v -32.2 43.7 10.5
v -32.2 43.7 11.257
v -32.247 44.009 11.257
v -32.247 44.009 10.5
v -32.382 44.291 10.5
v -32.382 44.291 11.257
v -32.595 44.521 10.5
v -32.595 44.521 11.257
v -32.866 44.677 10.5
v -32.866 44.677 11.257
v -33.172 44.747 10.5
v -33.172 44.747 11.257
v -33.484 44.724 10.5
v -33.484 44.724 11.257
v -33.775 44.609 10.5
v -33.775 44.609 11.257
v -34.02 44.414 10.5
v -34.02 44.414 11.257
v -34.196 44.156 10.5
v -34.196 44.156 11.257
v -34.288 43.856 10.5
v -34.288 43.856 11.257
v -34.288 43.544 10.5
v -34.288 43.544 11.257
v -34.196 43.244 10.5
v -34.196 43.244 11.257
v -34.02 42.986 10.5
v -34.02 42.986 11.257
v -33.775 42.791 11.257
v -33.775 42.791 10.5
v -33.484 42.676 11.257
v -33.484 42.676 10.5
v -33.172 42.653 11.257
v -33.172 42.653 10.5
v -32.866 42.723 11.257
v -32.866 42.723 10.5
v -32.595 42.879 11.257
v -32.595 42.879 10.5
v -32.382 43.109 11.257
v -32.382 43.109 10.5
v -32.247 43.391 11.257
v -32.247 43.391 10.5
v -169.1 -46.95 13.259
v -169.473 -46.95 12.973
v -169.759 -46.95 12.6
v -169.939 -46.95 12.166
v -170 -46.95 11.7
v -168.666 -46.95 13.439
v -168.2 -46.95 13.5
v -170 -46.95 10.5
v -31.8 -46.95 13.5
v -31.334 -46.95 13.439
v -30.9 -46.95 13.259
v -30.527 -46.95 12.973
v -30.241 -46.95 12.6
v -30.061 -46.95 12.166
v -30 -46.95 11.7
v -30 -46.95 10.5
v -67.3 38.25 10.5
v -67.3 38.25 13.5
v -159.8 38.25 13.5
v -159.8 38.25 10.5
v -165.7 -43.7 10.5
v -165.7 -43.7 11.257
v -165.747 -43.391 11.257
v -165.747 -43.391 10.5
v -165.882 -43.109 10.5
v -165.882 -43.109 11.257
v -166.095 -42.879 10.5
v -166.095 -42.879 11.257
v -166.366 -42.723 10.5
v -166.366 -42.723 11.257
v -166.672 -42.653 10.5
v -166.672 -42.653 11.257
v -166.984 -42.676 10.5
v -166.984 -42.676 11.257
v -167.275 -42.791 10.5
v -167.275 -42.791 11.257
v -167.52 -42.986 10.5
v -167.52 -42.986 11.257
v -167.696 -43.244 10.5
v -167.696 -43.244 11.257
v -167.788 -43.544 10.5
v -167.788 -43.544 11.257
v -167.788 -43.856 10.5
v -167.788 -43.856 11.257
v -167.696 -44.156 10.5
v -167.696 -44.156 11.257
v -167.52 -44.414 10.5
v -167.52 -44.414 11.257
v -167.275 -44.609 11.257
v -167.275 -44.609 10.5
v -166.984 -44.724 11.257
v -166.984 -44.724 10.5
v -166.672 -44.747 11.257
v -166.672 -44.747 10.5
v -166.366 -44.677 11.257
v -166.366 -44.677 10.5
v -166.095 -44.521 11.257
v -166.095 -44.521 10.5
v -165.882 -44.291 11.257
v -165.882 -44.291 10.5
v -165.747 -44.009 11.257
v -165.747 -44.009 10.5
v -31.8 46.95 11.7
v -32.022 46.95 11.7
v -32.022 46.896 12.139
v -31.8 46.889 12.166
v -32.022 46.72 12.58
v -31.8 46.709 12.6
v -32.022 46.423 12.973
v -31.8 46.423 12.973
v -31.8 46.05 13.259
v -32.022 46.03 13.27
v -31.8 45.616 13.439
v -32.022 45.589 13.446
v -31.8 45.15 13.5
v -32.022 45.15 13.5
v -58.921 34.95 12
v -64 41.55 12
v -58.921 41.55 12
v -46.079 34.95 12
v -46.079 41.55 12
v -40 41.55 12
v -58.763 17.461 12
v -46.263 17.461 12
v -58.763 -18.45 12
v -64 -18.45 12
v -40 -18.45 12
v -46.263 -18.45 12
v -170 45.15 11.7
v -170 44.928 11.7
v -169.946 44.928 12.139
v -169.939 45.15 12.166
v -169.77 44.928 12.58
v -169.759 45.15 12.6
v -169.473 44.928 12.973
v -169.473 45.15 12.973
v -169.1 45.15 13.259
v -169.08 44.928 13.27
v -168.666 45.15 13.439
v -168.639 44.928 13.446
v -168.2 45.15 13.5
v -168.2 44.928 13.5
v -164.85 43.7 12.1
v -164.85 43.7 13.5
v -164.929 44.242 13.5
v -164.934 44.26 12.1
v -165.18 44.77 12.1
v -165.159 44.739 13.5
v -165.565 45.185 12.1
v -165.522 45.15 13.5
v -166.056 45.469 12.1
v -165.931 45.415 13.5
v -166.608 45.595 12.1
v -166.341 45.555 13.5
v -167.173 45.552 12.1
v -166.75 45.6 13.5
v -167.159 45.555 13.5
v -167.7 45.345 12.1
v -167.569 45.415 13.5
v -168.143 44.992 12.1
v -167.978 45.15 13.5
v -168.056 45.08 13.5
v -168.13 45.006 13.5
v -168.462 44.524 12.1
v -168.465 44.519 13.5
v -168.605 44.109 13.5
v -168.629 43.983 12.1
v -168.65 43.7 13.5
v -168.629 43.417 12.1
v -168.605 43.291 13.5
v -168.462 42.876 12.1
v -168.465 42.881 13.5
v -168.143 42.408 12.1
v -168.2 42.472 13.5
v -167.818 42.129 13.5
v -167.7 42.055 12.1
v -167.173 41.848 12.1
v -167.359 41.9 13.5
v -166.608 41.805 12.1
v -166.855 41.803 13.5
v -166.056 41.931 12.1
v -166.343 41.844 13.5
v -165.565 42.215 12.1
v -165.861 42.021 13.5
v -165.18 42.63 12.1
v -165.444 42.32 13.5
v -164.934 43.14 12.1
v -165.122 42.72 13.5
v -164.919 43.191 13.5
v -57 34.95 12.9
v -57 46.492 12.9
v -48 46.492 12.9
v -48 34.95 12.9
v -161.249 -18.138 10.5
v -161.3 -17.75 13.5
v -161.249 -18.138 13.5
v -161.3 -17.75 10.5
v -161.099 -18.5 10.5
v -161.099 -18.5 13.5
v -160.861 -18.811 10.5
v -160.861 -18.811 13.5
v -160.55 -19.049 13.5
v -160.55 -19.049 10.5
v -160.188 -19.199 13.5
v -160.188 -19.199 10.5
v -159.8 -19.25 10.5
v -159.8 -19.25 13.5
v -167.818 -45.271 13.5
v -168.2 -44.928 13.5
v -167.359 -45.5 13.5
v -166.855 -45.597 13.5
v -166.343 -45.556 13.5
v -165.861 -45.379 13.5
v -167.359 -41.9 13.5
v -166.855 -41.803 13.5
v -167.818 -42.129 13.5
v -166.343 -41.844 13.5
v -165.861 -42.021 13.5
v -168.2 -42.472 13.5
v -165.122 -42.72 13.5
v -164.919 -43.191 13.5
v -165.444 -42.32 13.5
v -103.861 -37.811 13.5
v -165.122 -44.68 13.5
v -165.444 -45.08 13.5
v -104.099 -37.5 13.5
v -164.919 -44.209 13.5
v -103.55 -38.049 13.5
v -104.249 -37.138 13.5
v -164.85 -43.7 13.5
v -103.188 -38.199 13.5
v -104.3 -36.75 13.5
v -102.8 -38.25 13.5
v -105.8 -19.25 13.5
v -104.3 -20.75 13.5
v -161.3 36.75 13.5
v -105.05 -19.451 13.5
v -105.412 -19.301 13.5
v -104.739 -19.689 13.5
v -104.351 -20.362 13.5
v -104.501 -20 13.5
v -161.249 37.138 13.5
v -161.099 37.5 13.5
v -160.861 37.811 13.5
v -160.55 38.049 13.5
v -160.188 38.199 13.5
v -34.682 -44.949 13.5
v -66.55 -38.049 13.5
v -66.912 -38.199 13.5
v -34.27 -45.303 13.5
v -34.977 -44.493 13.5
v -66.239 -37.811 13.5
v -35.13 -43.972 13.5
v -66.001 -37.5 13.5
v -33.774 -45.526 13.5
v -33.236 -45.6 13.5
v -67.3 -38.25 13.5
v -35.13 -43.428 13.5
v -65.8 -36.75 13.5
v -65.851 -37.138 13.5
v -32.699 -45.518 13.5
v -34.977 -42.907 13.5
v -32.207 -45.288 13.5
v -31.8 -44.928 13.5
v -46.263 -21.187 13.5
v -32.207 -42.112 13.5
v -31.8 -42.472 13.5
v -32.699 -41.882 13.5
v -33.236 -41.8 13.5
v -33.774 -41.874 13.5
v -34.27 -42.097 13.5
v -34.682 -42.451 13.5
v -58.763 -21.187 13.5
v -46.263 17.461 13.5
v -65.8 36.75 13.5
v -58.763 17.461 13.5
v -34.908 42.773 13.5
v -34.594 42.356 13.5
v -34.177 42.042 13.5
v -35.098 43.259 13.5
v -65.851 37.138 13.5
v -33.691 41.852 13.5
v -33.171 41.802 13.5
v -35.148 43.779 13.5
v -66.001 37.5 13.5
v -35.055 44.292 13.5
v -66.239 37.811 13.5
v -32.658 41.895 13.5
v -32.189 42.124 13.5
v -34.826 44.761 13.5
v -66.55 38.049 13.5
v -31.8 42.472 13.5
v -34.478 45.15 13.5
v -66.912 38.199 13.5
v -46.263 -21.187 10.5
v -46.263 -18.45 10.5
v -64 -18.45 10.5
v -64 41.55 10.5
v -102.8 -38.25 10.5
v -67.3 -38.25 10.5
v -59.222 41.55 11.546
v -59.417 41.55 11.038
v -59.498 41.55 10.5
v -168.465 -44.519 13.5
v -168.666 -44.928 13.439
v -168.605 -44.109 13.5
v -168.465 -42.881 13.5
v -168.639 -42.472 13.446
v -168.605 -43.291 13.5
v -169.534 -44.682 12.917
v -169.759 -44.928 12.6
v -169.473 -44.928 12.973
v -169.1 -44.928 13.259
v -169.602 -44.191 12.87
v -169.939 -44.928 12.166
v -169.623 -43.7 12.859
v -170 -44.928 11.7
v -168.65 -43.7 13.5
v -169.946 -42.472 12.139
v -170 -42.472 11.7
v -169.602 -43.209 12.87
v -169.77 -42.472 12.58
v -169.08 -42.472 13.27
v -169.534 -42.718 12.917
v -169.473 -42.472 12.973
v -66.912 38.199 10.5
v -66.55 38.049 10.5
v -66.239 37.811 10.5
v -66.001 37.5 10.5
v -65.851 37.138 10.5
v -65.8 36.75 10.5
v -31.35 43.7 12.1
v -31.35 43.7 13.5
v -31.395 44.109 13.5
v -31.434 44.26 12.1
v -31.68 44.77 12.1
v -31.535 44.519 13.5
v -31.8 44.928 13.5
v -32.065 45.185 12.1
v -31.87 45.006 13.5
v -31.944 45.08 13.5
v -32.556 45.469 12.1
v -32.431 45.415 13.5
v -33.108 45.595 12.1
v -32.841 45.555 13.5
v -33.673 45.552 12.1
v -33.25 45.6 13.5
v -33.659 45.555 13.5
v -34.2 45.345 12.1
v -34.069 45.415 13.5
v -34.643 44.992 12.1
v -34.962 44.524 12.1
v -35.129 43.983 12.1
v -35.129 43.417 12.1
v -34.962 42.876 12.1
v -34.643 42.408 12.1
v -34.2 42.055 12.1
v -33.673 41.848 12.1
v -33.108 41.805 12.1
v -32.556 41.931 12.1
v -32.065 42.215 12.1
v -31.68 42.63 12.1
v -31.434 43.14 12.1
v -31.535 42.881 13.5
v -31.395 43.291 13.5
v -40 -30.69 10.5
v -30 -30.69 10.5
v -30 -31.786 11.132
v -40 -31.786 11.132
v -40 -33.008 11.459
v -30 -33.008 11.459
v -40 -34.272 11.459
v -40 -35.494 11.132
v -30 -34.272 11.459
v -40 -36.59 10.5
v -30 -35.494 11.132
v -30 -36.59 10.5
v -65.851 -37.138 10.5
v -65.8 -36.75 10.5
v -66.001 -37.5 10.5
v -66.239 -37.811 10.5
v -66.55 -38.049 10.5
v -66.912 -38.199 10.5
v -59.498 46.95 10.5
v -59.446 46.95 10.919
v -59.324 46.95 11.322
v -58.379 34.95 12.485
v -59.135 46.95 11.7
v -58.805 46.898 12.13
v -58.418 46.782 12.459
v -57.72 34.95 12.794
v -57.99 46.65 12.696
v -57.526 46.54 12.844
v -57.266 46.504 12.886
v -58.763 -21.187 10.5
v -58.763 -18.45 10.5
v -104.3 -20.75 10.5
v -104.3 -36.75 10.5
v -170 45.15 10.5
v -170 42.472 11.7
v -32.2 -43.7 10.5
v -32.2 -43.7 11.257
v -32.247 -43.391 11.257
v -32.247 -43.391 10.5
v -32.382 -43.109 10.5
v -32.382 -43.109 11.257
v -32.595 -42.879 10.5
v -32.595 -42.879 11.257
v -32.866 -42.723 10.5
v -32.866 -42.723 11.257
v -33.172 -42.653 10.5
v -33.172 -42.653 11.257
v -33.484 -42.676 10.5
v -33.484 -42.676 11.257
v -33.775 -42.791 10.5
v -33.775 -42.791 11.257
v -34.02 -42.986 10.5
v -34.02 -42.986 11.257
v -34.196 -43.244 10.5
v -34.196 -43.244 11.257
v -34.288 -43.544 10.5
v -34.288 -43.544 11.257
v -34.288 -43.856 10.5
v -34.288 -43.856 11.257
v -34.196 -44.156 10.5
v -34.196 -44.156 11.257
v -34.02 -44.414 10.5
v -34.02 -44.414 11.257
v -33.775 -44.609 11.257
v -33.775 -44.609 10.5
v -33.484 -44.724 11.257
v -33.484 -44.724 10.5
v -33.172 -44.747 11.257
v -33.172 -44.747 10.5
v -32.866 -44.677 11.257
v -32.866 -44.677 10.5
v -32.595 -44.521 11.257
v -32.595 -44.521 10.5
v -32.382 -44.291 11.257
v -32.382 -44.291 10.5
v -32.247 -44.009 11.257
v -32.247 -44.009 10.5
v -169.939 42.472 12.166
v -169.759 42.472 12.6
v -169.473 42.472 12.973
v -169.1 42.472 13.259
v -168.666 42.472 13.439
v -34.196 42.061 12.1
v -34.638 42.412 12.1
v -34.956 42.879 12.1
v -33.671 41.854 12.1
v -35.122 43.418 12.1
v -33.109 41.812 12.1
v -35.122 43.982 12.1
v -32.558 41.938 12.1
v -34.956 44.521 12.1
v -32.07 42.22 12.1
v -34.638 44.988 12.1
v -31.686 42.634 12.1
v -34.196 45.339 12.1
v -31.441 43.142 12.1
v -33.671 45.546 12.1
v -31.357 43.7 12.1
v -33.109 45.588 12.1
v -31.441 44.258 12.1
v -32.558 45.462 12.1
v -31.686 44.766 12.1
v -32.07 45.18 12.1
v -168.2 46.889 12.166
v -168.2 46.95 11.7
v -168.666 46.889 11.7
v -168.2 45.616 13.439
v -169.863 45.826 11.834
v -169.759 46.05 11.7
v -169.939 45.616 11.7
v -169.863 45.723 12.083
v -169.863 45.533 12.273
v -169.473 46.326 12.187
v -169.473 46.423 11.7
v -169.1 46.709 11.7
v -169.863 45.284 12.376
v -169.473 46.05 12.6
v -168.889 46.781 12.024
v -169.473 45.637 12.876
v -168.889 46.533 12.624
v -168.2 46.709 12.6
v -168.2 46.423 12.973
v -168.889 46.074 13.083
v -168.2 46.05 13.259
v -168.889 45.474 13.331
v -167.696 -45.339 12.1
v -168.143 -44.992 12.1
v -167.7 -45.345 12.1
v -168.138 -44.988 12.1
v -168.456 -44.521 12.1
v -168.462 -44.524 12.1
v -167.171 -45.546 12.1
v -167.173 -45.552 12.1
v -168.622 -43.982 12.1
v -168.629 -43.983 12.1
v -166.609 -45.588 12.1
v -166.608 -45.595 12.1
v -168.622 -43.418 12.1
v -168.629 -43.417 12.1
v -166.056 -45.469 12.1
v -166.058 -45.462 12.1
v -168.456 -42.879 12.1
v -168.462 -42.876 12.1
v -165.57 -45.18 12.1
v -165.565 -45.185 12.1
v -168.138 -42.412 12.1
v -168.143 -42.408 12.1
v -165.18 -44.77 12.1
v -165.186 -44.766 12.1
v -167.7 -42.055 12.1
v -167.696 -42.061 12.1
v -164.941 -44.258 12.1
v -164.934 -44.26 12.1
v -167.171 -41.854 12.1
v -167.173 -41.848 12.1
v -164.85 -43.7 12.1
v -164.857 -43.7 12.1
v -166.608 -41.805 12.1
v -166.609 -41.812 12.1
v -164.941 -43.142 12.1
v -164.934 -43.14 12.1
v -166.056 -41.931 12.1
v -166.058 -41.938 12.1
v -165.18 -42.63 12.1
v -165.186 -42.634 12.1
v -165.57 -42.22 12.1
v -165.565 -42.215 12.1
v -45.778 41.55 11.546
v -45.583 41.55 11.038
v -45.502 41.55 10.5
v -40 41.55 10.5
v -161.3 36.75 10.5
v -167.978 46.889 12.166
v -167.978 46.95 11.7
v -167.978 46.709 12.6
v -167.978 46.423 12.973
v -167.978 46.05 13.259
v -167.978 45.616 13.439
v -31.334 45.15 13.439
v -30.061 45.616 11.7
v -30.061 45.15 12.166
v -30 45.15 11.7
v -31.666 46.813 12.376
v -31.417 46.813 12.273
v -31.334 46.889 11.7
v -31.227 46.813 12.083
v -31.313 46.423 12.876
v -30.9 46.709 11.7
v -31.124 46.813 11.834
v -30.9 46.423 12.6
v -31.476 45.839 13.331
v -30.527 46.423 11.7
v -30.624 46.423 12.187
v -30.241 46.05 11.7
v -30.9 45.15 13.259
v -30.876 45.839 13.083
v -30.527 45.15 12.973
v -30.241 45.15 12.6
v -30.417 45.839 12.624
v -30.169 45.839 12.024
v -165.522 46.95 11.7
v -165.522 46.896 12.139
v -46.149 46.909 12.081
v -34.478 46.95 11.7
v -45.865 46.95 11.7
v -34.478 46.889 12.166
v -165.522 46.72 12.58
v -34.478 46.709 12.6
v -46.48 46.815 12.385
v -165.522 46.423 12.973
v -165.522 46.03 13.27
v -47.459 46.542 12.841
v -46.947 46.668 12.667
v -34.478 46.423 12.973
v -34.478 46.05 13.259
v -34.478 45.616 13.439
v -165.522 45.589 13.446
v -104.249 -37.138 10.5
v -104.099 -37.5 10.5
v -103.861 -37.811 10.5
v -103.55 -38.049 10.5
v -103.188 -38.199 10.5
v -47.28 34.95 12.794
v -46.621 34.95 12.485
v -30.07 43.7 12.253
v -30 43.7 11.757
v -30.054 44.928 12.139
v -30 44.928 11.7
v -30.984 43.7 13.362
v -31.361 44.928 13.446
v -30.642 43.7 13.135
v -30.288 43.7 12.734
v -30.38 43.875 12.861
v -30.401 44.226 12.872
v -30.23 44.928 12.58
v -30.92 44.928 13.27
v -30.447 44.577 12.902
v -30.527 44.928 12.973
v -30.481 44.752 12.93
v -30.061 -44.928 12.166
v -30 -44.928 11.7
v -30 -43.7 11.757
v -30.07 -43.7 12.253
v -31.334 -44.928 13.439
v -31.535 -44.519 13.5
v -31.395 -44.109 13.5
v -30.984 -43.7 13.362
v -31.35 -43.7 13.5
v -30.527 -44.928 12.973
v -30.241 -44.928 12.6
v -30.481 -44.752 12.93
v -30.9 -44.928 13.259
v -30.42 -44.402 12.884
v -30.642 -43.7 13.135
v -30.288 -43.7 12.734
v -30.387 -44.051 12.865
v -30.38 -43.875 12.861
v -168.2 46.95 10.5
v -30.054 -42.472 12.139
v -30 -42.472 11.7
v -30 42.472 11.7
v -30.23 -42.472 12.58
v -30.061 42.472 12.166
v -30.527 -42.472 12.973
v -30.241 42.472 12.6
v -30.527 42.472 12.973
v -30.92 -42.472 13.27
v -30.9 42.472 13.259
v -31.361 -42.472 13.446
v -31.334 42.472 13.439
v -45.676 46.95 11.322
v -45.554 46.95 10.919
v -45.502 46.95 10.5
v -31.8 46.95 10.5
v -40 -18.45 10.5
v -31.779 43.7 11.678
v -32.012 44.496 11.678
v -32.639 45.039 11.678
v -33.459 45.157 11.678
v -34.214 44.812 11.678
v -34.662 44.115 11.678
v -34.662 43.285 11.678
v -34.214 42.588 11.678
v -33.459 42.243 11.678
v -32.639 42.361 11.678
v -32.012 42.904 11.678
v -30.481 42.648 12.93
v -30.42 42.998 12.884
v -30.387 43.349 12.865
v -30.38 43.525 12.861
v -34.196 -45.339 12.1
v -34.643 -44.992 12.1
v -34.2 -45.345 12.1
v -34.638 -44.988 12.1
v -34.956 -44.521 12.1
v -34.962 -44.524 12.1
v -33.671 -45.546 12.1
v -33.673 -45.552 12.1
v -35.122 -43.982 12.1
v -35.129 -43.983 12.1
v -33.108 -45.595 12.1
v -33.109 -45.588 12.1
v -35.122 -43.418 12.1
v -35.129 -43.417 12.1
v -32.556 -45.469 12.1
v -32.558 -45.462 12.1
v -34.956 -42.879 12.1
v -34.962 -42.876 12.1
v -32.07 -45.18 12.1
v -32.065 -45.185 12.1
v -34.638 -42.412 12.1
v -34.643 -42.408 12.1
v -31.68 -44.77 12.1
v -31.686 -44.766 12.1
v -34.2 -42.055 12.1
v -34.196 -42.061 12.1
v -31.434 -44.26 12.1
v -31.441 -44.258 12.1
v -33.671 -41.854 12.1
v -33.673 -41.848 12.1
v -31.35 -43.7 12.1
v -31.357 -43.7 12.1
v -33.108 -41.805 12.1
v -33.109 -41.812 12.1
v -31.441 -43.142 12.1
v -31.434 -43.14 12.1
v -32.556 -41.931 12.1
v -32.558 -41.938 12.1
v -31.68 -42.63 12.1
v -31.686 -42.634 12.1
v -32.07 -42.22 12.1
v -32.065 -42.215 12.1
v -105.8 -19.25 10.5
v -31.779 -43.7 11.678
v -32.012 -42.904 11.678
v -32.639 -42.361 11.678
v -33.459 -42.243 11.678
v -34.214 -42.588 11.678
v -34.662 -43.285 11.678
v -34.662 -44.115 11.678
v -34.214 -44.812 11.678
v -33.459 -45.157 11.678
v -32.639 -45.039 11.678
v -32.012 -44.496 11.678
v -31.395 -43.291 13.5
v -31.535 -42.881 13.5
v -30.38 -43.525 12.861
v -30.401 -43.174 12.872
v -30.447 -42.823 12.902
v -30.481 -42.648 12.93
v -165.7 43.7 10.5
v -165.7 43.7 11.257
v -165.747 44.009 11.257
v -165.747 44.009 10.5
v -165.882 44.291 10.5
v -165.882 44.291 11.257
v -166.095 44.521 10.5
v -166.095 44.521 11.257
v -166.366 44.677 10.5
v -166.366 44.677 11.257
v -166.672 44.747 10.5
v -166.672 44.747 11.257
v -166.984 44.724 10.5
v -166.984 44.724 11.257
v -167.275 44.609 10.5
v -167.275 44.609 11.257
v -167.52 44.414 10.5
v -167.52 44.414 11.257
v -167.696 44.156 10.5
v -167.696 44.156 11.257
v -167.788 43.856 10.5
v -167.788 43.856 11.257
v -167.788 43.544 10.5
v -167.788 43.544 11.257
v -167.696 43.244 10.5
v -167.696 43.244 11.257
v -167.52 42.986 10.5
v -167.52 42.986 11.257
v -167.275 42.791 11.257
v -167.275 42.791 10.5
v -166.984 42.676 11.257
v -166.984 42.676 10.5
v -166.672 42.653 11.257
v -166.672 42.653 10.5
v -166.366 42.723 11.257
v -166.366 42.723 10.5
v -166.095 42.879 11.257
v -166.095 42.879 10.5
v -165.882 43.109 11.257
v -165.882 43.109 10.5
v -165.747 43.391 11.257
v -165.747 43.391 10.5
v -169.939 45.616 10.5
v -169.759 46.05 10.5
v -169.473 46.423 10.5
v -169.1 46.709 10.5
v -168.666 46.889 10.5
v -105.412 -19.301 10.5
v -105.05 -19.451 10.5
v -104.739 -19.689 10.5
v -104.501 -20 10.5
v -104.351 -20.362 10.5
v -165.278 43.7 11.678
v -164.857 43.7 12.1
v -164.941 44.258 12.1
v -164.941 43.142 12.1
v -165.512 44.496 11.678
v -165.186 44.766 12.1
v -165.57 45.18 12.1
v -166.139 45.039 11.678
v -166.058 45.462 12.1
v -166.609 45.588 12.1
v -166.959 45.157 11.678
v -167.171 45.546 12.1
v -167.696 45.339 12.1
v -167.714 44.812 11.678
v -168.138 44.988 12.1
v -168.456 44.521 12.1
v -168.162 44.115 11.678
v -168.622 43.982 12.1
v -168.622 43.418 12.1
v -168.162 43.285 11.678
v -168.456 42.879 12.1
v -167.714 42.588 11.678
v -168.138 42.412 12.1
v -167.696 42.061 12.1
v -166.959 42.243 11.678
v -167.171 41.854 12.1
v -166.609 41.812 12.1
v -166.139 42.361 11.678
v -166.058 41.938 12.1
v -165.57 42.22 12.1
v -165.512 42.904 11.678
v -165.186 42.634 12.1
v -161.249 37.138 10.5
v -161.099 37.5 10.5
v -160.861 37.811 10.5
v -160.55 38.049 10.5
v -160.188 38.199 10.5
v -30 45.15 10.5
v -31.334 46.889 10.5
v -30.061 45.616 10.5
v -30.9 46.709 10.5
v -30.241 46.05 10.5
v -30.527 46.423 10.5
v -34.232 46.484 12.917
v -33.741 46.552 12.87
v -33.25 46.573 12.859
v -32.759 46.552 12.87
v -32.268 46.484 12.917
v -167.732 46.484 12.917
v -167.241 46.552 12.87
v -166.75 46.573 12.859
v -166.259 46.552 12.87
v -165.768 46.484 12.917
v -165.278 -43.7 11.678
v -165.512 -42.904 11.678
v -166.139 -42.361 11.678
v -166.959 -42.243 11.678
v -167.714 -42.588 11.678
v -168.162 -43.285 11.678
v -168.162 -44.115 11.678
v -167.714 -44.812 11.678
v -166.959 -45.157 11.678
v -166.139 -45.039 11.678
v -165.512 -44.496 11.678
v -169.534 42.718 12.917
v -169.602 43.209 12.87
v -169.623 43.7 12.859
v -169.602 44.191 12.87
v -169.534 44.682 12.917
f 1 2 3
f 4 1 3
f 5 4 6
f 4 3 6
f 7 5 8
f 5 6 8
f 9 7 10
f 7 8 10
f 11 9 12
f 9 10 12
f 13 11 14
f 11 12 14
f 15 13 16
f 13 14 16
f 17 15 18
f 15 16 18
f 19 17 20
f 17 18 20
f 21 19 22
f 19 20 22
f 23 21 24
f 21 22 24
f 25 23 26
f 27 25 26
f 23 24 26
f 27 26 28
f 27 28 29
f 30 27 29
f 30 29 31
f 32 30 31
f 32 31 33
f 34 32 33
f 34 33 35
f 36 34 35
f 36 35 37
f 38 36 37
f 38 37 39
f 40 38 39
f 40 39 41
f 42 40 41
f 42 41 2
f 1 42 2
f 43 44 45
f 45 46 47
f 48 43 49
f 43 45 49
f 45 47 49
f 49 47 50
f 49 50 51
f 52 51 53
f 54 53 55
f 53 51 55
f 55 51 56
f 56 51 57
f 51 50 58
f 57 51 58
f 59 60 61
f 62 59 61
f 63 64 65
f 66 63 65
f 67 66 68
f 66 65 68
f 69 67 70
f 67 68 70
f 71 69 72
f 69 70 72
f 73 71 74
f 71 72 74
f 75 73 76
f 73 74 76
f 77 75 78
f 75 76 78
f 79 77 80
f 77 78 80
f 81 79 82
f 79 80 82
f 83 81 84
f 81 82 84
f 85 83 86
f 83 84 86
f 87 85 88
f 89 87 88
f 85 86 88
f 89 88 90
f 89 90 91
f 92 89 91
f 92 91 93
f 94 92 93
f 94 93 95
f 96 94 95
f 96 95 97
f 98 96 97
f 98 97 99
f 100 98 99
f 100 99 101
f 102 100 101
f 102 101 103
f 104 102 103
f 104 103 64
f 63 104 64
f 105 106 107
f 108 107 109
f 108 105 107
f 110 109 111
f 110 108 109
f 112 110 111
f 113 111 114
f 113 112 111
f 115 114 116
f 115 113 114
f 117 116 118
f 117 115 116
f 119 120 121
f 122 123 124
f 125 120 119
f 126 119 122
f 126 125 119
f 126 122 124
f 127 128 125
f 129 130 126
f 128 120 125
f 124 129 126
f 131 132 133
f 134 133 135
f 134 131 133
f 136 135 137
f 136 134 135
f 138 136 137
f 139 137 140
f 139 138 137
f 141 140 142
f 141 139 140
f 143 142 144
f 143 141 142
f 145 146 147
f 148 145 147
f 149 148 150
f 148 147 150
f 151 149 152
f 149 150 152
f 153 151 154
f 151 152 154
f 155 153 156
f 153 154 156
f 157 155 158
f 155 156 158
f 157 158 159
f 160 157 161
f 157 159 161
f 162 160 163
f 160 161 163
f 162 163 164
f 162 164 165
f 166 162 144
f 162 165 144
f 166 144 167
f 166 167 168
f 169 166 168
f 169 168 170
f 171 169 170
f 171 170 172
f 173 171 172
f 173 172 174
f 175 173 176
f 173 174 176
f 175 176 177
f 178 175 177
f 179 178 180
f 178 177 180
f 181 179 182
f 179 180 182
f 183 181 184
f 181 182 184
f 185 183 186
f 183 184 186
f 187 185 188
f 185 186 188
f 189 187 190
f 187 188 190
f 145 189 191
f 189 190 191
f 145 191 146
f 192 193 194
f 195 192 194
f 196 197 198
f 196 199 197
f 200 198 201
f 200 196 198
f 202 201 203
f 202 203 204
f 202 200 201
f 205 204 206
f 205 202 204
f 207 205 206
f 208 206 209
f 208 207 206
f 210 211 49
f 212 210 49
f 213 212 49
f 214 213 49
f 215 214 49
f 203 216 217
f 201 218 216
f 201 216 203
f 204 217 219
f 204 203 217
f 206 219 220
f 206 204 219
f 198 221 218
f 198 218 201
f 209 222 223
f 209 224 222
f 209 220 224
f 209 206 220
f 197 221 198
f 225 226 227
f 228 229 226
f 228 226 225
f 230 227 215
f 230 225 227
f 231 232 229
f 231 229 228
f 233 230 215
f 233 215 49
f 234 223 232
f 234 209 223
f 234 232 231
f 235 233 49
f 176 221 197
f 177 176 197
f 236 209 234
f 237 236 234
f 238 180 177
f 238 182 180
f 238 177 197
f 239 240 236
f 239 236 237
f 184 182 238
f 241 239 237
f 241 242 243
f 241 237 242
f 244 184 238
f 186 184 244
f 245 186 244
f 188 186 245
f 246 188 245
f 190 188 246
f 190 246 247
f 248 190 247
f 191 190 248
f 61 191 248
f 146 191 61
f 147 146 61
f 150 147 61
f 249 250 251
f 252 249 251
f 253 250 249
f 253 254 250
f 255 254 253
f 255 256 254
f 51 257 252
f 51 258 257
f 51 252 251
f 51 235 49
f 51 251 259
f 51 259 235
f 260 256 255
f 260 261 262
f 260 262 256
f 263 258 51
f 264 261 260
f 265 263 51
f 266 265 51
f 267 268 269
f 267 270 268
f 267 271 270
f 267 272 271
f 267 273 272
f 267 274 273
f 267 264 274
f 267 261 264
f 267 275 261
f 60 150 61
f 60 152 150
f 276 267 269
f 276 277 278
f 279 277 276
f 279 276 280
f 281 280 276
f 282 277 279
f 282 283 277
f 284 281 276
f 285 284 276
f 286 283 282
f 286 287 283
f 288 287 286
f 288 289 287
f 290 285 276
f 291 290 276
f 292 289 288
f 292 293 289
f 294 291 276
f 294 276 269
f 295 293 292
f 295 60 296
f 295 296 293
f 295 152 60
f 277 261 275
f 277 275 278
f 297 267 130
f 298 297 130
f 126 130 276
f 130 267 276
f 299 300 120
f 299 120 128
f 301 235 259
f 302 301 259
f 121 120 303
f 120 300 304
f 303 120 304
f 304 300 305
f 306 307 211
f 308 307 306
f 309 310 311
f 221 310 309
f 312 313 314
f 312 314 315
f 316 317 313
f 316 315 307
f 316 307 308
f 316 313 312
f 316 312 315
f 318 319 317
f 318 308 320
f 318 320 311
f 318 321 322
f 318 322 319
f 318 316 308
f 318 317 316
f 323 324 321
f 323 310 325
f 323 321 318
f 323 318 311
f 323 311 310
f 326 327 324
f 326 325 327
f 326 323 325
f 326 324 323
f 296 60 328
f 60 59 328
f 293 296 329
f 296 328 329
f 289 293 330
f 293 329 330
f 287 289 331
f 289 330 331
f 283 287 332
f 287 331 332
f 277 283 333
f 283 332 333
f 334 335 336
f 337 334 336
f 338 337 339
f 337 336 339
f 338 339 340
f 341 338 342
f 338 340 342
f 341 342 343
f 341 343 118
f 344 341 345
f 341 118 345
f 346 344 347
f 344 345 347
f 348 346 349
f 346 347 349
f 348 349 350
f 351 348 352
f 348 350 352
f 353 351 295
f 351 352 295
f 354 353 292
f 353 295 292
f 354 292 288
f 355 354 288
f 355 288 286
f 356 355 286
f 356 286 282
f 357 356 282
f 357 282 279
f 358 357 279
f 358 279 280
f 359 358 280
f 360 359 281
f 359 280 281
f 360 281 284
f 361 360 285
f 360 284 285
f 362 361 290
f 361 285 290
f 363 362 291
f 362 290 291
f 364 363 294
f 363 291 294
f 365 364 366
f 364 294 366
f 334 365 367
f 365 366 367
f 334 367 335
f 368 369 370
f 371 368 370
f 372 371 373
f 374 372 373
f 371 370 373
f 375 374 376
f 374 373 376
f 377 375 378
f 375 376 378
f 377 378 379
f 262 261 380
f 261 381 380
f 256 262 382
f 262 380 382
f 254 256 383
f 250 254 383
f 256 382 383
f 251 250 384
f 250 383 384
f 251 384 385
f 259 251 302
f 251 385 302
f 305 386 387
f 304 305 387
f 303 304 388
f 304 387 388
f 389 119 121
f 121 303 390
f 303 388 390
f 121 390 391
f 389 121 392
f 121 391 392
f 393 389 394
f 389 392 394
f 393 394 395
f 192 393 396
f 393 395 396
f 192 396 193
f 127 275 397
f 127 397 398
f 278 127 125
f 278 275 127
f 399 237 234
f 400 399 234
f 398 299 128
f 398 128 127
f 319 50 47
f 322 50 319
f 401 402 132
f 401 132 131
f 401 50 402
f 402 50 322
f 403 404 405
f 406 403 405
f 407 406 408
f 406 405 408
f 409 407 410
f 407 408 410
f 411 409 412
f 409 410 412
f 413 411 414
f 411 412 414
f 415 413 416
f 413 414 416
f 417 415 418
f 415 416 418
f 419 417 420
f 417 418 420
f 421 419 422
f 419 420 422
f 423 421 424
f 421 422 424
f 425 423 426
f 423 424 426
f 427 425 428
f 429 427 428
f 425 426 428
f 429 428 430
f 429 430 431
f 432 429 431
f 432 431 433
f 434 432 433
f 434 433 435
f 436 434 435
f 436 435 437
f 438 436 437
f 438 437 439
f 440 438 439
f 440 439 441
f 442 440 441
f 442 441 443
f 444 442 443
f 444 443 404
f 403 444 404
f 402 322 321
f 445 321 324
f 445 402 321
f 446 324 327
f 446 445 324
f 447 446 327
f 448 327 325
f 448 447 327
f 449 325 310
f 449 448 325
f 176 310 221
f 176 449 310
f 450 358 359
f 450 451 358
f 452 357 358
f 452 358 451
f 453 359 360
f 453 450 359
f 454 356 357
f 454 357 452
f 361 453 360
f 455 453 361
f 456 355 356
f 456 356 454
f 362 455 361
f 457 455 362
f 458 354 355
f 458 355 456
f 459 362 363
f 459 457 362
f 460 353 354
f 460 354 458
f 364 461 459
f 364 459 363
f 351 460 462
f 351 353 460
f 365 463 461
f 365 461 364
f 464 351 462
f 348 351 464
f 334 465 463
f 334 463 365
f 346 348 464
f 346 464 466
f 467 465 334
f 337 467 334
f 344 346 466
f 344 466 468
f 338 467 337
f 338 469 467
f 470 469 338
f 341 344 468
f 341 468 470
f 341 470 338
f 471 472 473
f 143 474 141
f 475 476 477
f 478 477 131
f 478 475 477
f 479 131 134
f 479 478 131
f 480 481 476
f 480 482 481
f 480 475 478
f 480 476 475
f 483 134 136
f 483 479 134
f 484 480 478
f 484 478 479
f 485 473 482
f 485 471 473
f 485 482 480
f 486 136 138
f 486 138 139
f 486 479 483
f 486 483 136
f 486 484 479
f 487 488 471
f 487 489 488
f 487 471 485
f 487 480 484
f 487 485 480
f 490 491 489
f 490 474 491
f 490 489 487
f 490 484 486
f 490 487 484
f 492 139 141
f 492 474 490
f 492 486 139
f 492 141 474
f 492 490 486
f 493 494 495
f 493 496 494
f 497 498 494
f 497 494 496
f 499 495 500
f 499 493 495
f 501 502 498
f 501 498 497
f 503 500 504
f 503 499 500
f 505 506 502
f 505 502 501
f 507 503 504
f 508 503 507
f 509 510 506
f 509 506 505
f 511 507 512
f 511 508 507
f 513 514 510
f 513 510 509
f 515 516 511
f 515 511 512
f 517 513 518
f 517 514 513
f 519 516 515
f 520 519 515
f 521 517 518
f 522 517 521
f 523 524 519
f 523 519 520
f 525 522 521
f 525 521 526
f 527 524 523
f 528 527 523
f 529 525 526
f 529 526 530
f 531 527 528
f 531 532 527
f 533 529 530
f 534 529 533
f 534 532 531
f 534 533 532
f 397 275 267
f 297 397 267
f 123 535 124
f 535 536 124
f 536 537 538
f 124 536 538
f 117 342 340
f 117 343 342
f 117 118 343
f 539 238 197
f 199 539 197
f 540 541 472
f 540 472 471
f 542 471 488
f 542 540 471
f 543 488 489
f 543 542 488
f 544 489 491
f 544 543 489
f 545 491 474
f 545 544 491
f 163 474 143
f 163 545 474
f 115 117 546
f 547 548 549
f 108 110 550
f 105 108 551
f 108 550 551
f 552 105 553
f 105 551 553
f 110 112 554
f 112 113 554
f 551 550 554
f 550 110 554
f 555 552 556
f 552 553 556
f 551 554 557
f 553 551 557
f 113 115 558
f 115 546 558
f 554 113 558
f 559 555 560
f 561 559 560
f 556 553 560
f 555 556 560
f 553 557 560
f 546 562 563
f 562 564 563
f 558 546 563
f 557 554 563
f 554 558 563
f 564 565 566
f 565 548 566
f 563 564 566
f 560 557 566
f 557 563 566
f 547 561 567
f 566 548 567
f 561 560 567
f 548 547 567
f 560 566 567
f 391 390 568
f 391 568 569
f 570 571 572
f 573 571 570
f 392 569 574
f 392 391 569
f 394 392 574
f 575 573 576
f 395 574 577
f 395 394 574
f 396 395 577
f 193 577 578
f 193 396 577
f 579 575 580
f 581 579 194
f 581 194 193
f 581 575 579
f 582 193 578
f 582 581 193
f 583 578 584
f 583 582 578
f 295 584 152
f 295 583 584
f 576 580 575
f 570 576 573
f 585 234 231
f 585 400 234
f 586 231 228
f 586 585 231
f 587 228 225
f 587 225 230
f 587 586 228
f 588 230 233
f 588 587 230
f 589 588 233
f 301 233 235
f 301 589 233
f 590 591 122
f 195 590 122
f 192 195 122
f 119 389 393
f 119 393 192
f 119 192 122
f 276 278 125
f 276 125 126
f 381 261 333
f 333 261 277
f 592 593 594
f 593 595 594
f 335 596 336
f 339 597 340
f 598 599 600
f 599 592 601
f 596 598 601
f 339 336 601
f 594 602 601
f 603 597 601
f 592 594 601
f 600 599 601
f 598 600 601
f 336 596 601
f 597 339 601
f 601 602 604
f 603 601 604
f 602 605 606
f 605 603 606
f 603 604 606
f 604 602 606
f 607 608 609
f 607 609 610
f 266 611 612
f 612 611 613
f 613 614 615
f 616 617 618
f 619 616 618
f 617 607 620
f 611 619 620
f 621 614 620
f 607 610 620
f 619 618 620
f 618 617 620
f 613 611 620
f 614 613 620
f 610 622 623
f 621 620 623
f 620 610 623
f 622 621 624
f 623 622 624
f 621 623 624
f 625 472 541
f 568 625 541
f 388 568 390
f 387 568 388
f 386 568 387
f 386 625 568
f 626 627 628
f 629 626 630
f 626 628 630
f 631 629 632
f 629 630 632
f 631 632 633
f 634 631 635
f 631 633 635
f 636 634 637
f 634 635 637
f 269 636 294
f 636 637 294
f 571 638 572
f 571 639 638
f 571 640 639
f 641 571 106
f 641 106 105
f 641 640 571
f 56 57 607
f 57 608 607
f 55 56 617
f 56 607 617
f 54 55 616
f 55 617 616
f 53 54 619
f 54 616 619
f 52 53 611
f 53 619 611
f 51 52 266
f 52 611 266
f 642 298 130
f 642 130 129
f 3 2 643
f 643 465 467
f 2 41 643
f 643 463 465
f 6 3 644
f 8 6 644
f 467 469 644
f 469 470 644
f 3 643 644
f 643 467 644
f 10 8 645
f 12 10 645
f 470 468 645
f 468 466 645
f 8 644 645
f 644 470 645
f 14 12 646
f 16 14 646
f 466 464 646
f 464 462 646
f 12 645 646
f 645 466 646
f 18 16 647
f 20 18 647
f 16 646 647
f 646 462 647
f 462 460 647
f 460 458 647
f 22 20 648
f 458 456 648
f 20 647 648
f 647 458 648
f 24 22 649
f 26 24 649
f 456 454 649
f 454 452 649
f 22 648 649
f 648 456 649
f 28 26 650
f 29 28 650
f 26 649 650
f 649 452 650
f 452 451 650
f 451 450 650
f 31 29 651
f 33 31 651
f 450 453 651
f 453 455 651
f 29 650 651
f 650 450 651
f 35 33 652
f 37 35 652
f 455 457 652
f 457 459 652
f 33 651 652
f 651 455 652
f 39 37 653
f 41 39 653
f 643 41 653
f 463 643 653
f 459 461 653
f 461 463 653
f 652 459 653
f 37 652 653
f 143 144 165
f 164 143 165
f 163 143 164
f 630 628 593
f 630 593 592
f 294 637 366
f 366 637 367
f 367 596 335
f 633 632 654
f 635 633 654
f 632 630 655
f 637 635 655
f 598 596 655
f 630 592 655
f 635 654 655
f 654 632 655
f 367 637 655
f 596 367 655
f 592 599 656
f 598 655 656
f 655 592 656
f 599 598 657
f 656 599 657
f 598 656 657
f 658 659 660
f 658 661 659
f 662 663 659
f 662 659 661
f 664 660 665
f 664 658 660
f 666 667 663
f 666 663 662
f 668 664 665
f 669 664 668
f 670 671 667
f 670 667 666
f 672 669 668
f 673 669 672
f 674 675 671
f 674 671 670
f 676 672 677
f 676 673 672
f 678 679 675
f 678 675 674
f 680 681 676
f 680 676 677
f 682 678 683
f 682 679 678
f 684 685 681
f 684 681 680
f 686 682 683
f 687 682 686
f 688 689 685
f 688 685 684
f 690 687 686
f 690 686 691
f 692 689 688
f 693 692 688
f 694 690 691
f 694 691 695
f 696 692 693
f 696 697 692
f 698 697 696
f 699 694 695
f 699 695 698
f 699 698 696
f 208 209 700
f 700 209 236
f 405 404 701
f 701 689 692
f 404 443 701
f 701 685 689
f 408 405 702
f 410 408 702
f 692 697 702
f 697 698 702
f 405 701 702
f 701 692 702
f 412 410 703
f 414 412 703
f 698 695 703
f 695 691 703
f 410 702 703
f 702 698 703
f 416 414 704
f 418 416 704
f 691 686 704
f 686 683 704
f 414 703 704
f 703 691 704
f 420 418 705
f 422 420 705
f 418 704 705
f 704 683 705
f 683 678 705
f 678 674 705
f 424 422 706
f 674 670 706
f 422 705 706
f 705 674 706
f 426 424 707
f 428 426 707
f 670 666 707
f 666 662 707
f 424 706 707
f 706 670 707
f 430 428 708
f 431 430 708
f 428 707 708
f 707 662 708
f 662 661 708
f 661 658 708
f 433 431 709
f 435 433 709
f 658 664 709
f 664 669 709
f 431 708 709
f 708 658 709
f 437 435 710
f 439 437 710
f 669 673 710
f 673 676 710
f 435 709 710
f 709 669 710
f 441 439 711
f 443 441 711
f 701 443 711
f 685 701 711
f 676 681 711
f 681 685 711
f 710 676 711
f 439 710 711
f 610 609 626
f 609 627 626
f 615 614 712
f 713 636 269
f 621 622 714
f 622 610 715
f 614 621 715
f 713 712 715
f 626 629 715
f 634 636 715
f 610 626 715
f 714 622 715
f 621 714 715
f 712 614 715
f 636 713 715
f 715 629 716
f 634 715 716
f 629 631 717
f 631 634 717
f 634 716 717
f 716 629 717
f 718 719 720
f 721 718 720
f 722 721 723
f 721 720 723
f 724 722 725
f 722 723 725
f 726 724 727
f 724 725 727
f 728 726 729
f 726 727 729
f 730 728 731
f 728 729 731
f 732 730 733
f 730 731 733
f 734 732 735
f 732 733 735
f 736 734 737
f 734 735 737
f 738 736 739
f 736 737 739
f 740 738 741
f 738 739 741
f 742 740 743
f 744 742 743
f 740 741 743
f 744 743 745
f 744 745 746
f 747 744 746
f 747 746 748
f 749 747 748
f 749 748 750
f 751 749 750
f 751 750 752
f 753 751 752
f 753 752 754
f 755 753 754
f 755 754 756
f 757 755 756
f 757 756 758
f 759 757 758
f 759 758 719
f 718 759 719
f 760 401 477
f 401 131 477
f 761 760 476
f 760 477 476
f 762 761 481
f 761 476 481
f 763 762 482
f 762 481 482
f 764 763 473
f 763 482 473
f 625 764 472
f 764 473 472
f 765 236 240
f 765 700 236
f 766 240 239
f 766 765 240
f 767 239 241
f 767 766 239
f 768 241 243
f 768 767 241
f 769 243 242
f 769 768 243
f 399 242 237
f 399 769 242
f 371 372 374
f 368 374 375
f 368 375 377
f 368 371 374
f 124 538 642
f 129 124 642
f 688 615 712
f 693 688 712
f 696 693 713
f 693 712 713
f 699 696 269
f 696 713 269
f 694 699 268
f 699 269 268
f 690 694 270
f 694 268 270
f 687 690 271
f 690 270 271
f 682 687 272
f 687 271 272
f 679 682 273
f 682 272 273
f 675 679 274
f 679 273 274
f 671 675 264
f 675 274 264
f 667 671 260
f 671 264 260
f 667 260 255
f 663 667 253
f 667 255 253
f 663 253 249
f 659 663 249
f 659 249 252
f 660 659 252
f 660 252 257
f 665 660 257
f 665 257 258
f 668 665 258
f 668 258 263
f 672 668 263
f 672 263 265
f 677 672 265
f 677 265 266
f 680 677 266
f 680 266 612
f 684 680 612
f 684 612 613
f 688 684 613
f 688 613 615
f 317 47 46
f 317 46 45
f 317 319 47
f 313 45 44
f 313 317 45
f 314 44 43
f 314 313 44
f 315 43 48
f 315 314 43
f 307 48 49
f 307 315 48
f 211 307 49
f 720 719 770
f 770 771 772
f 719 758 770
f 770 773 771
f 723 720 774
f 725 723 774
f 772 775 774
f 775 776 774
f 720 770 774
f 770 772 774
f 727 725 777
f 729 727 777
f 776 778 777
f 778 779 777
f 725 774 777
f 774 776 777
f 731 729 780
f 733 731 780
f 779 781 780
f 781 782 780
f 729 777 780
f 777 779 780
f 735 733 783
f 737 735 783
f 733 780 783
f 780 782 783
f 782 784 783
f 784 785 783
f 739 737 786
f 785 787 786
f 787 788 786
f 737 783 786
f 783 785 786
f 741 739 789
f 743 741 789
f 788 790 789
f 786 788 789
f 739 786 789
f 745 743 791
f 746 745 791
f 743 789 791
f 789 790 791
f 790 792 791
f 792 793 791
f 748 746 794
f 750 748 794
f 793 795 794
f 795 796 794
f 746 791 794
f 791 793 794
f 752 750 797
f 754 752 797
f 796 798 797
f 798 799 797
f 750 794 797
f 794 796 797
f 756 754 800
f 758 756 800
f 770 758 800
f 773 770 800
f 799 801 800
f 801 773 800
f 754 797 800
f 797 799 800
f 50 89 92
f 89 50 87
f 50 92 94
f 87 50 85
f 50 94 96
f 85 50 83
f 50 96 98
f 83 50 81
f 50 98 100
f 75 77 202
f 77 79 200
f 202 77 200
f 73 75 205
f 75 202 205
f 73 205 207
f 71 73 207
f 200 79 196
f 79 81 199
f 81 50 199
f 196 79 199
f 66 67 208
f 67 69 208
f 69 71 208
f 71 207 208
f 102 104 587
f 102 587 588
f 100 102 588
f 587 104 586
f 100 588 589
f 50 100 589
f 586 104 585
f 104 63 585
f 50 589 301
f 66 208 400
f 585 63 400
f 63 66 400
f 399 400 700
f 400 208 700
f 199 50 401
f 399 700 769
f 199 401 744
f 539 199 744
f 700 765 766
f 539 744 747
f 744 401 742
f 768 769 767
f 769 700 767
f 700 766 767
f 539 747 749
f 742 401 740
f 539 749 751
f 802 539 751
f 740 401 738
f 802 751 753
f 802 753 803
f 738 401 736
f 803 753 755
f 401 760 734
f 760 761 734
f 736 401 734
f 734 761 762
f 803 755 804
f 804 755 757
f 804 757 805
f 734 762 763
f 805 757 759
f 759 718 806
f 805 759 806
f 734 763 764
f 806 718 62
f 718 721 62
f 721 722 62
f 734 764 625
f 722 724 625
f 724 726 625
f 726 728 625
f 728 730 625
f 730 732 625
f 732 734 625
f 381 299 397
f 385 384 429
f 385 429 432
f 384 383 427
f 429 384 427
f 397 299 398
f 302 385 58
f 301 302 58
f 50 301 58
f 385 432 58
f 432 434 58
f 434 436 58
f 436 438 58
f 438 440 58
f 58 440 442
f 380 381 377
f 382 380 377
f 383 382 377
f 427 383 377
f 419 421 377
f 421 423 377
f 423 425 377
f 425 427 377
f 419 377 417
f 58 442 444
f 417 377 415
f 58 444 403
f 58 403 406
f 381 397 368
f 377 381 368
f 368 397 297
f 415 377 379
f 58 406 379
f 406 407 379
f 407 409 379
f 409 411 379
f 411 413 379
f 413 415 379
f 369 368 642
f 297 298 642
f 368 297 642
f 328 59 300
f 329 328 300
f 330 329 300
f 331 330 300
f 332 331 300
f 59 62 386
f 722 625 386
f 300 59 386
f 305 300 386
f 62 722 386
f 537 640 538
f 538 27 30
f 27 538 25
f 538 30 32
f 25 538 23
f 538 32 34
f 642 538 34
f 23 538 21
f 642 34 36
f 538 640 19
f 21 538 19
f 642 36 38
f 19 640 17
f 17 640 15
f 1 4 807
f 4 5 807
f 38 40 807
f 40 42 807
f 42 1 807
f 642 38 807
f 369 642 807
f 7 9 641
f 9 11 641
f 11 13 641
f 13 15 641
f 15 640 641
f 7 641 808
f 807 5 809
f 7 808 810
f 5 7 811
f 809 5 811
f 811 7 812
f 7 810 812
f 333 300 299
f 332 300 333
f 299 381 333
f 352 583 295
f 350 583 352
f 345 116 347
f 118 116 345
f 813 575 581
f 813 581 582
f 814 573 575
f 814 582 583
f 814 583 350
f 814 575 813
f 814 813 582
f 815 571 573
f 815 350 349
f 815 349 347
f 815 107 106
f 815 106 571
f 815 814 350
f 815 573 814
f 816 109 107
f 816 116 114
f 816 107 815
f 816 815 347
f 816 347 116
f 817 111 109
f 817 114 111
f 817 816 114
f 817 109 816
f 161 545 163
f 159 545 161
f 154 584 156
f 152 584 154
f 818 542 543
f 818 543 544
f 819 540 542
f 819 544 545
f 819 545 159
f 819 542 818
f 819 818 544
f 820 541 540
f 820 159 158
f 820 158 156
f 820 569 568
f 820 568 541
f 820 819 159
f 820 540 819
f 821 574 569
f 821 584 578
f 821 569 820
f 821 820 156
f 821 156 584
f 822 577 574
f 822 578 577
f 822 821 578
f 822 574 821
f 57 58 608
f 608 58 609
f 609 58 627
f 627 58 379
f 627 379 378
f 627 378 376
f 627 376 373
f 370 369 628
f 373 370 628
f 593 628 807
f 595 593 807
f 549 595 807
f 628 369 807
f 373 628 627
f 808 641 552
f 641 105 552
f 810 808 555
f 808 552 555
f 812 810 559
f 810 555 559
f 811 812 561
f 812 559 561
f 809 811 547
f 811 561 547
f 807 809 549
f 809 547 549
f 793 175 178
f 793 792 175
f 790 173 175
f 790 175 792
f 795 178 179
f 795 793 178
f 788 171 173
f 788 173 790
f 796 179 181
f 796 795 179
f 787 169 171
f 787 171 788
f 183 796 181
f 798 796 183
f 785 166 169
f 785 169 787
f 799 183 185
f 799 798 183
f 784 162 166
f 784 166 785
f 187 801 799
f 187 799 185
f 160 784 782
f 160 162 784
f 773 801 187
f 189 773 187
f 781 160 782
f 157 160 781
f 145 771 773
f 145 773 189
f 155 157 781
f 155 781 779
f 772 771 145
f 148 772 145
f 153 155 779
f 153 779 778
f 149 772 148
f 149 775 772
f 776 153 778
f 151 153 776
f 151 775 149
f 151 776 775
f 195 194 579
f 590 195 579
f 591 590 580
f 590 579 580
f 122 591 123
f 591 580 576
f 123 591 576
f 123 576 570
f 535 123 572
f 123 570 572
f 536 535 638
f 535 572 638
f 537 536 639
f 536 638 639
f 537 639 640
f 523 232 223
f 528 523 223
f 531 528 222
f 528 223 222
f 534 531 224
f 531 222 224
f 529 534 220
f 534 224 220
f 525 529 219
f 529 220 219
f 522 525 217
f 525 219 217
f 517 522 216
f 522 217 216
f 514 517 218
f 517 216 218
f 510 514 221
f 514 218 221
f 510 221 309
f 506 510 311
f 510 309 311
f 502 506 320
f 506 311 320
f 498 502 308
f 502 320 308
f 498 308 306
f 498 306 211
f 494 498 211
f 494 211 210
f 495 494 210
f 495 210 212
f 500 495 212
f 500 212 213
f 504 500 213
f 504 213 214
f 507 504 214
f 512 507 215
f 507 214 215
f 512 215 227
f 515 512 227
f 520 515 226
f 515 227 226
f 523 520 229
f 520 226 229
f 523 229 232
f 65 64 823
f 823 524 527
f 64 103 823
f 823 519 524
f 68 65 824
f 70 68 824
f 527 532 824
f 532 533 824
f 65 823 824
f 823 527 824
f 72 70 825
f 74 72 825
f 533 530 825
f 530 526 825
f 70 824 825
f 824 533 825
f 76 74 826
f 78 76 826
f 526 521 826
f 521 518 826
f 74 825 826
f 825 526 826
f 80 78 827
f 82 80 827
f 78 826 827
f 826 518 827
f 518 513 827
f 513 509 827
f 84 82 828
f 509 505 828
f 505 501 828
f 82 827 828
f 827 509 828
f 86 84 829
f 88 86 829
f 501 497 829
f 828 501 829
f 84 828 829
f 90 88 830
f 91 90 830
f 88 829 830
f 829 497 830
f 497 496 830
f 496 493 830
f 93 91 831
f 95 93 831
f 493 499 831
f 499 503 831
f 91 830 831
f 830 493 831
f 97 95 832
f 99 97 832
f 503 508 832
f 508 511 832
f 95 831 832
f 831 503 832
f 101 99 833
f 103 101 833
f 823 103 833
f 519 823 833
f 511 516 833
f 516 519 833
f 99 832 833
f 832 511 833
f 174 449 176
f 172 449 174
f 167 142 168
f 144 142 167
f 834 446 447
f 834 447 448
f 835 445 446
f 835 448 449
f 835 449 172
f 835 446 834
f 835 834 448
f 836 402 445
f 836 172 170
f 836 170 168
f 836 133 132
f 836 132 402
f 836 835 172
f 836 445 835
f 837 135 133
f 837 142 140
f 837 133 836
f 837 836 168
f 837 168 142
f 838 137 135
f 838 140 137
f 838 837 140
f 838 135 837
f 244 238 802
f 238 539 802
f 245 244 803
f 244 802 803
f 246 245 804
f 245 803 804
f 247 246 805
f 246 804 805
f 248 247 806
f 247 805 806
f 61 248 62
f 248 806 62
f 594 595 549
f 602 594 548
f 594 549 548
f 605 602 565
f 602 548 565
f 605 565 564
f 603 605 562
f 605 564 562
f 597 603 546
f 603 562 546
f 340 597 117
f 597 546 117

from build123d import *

# Parameters (mm, degrees)
SKETCH038_W        = 140
SKETCH038_H        = 93.9
PAD004_DEPTH       = 3
SKETCH039_W        = 12.5
SKETCH039_H        = 38.6472
POCKET028_DEPTH    = 3
SKETCH040_W        = 24
SKETCH040_H        = 60
POCKET029_DEPTH    = 1.5
SKETCH041_R        = 1.05
POCKET030_DEPTH    = 3.001
SKETCH042_R        = 1.9
POCKET031_DEPTH    = 1.4
CHAMFER001_1_ANGLE = 45
CHAMFER001_1_SIZE  = 0.843
CHAMFER001_2_ANGLE = 45
CHAMFER001_2_SIZE  = 0.843
CHAMFER001_3_ANGLE = 45
CHAMFER001_3_SIZE  = 0.843
CHAMFER001_4_ANGLE = 45
CHAMFER001_4_SIZE  = 0.843
FILLET004_R        = 1.5
SKETCH043_R        = 4.85
POCKET032_DEPTH    = 10
FILLET005_R        = 1.8
POCKET033_DEPTH    = 12


with BuildPart() as part:
    # Sketch038 (on XY_Plane154 of Origin468) → Pad004 (new body)
    with BuildSketch(Plane.XY):
        Rectangle(SKETCH038_W, SKETCH038_H)
    extrude(amount=PAD004_DEPTH)

    # Sketch039 (on Face6 of Pad004) → Pocket028 (cut)
    with BuildSketch(Plane.XY.offset(3)):
        Polygon((-61.3, 38.25), (-61.3, -19.25), (-4.3, -19.25), (-4.3, -38.25), (34.2, -38.25), (34.2, 38.25), align=None)
        with Locations((47.48708, -1.86296)):
            Rectangle(SKETCH039_W, SKETCH039_H)
    extrude(amount=-POCKET028_DEPTH, mode=Mode.SUBTRACT)

    # Sketch040 (on Face4 of Pocket028) → Pocket029 (cut)
    with BuildSketch(Plane(origin=(0, 0, 0), x_dir=(1, 0, 0), z_dir=(0, 0, -1))):
        with Locations((48, -11.55)):
            Rectangle(SKETCH040_W, SKETCH040_H)
    extrude(amount=-POCKET029_DEPTH, mode=Mode.SUBTRACT)

    # Sketch041 (on Face5 of Pocket029) → Pocket030 (cut, through all)
    with BuildSketch(Plane.XY.offset(3)):
        with Locations((66.75, 43.7)):
            Circle(SKETCH041_R)
        with Locations((66.75, -43.7)):
            Circle(SKETCH041_R)
        with Locations((-66.75, -43.7)):
            Circle(SKETCH041_R)
        with Locations((-66.75, 43.7)):
            Circle(SKETCH041_R)
    extrude(amount=-POCKET030_DEPTH, mode=Mode.SUBTRACT)

    # Sketch042 (on Face5 of Pocket030) → Pocket031 (cut)
    with BuildSketch(Plane.XY.offset(3)):
        with Locations((-66.75, 43.7)):
            Circle(SKETCH042_R)
        with Locations((66.75, 43.7)):
            Circle(SKETCH042_R)
        with Locations((-66.75, -43.7)):
            Circle(SKETCH042_R)
        with Locations((66.75, -43.7)):
            Circle(SKETCH042_R)
    extrude(amount=-POCKET031_DEPTH, mode=Mode.SUBTRACT)

    # Chamfer001 1
    chamfer001_1_edges = [part.edges().sort_by_distance(p)[0] for p in [
        (-67.8, 43.7, 1.6),
    ]]
    chamfer001_1_side = part.faces().sort_by_distance((-67.8, 43.7, 0.8))[0]
    chamfer(chamfer001_1_edges, length=CHAMFER001_1_SIZE, angle=CHAMFER001_1_ANGLE, reference=chamfer001_1_side)

    # Chamfer001 2
    chamfer001_2_edges = [part.edges().sort_by_distance(p)[0] for p in [
        (65.7, -43.7, 1.6),
    ]]
    chamfer001_2_side = part.faces().sort_by_distance((65.7, -43.7, 0.8))[0]
    chamfer(chamfer001_2_edges, length=CHAMFER001_2_SIZE, angle=CHAMFER001_2_ANGLE, reference=chamfer001_2_side)

    # Chamfer001 3
    chamfer001_3_edges = [part.edges().sort_by_distance(p)[0] for p in [
        (-67.8, -43.7, 1.6),
    ]]
    chamfer001_3_side = part.faces().sort_by_distance((-67.8, -43.7, 0.8))[0]
    chamfer(chamfer001_3_edges, length=CHAMFER001_3_SIZE, angle=CHAMFER001_3_ANGLE, reference=chamfer001_3_side)

    # Chamfer001 4
    chamfer001_4_edges = [part.edges().sort_by_distance(p)[0] for p in [
        (65.7, 43.7, 1.6),
    ]]
    chamfer001_4_side = part.faces().sort_by_distance((65.7, 43.7, 0.8))[0]
    chamfer(chamfer001_4_edges, length=CHAMFER001_4_SIZE, angle=CHAMFER001_4_ANGLE, reference=chamfer001_4_side)

    # Fillet004
    fillet004_edges = [part.edges().sort_by_distance(p)[0] for p in [
        (-4.3, -38.25, 1.5),
        (34.2, -38.25, 1.5),
        (34.2, 38.25, 1.5),
        (-61.3, 38.25, 1.5),
        (-61.3, -19.25, 1.5),
        (-4.3, -19.25, 1.5),
    ]]
    fillet(fillet004_edges, radius=FILLET004_R)

    # Sketch043 (on Face16 of Fillet004) → Pocket032 (cut)
    with BuildSketch(Plane.YZ.offset(70)):
        with Locations((-33.64, -3.85)):
            Circle(SKETCH043_R)
    extrude(amount=-POCKET032_DEPTH, mode=Mode.SUBTRACT)

    # Fillet005
    fillet005_edges = [part.edges().sort_by_distance(p)[0] for p in [
        (70, 0, 3),
        (0, 46.95, 3),
        (70, 46.95, 1.5),
        (-70, 46.95, 1.5),
        (-70, 0, 3),
    ]]
    fillet(fillet005_edges, radius=FILLET005_R)

    # Sketch044 (on Face5 of Fillet005) → Pocket033 (cut)
    with BuildSketch(Plane(origin=(0, 46.95, 0), x_dir=(-1, 0, 0), z_dir=(0, 1, 0))):
        with BuildLine():
            Line((-40.5, -3.1), (-40.5, -0.1))
            ThreePointArc((-40.5, -0.1), (-41.232233, 1.667767), (-43, 2.4))
            Line((-43, 2.4), (-52, 2.4))
            ThreePointArc((-52, 2.4), (-53.767767, 1.667767), (-54.5, -0.1))
            Line((-54.5, -0.1), (-54.5, -3.1))
            ThreePointArc((-54.5, -3.1), (-53.767767, -4.867767), (-52, -5.6))
            Line((-52, -5.6), (-43, -5.6))
            ThreePointArc((-43, -5.6), (-41.232233, -4.867767), (-40.5, -3.1))
        make_face()
    extrude(amount=-POCKET033_DEPTH, mode=Mode.SUBTRACT)


with BuildPart() as part_1:
    # Body003 placement: moved
    add(part.part.moved(Location((-100, 0, 10.5))))


solid = part_1.part
